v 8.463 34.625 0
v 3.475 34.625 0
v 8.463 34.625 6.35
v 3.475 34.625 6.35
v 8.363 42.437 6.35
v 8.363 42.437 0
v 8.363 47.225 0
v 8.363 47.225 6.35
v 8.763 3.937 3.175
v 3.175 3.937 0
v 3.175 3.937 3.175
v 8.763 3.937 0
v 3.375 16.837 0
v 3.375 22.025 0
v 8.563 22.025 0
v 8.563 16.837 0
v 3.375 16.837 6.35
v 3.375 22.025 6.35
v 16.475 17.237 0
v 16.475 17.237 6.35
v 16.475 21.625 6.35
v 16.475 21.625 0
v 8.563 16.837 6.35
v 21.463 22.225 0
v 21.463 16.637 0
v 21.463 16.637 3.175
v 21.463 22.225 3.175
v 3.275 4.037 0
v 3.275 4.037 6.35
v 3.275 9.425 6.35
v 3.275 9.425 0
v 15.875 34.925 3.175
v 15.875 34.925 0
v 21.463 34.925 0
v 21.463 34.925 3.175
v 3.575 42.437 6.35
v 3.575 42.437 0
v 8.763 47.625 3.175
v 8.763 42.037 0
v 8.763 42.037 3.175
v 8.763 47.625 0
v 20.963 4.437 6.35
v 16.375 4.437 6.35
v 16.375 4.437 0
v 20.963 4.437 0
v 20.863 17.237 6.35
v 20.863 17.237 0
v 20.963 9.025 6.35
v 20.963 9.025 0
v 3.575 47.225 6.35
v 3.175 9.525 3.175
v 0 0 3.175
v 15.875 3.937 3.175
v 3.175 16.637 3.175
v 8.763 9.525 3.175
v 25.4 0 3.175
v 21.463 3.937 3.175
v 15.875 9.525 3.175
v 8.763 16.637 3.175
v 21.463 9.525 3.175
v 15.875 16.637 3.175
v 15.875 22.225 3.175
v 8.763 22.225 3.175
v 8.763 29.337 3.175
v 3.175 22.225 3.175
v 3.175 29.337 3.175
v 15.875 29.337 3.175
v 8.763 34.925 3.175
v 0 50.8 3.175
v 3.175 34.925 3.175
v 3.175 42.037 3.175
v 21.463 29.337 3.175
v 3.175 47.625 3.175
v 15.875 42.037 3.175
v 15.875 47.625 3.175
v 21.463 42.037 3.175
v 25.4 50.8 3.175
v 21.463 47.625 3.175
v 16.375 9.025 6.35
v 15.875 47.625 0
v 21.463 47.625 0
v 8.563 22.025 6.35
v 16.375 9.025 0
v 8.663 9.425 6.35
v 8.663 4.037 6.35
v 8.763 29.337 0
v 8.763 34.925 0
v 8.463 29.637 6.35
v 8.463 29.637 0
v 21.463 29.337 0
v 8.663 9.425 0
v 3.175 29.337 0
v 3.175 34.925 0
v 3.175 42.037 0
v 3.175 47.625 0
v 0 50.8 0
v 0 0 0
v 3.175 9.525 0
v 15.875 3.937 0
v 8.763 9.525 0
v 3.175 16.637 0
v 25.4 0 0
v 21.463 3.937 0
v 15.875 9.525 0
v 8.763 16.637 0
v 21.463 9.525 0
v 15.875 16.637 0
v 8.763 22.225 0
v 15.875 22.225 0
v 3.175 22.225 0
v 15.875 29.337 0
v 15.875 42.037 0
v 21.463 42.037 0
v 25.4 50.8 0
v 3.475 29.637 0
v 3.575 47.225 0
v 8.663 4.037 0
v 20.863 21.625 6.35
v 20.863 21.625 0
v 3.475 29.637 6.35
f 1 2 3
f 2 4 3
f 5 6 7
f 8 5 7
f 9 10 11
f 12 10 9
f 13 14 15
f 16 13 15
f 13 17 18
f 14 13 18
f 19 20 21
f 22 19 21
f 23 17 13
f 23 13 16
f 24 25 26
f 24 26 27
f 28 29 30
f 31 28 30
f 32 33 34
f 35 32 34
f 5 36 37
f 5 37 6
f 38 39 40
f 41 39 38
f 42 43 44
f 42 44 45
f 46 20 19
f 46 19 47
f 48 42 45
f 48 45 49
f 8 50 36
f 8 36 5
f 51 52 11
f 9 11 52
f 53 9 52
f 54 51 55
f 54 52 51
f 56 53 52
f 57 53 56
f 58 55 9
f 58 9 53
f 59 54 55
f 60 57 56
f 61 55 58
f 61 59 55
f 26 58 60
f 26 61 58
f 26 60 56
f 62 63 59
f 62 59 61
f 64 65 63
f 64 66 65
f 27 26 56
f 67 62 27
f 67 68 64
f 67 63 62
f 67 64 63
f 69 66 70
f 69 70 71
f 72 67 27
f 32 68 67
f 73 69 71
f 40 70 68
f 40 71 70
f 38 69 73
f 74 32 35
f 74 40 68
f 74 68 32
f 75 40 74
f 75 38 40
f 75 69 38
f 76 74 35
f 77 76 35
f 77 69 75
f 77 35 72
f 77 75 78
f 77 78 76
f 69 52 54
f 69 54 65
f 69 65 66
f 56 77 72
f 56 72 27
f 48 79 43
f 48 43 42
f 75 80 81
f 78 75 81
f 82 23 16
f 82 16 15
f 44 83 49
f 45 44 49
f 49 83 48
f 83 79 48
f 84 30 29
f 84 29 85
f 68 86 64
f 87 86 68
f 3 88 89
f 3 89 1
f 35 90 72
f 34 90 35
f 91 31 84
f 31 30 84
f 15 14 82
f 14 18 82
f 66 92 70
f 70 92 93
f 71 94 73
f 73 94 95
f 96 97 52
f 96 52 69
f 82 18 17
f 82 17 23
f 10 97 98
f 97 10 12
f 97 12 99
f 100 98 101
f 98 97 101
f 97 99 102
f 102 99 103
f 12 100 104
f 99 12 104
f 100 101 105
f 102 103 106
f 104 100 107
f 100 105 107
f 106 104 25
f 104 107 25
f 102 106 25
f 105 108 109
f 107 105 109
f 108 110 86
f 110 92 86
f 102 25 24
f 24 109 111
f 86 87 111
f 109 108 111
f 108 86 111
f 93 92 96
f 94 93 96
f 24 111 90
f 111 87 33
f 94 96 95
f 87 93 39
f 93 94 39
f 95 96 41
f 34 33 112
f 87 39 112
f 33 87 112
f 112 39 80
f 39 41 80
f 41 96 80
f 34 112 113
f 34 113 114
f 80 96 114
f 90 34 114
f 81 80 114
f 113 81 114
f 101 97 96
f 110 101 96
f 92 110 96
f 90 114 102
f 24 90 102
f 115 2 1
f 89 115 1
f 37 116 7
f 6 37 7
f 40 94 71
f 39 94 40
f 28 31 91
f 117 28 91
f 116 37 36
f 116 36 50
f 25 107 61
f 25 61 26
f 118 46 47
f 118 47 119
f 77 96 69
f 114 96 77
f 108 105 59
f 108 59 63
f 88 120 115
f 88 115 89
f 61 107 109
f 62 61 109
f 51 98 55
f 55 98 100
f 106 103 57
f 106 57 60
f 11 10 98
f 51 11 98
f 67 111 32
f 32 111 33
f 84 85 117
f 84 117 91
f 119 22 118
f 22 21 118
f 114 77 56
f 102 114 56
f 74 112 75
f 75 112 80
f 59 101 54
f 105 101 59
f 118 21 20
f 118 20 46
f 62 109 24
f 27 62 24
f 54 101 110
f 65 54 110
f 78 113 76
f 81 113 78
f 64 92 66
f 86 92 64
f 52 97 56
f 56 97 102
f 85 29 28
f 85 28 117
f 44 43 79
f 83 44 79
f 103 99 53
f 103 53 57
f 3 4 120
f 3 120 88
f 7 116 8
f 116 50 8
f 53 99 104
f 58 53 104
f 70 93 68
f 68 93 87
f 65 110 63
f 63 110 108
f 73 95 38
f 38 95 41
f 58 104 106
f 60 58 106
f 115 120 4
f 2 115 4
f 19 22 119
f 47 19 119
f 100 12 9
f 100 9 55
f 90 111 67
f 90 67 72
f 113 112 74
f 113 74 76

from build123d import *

# Parameters (mm, degrees)
F0_W          = 50.8
F0_H          = 50.8
F0_W_2        = 5.588
F0_H_2        = 5.588
F1_DEPTH      = 3.175
F2_W          = 5.188
F2_H          = 5.188
F2_W_2        = 5.388
F2_H_2        = 5.388
F2_W_3        = 4.988
F2_H_3        = 4.988
F2_W_4        = 4.788
F2_H_4        = 4.788
F2_W_5        = 4.388
F2_H_5        = 4.388
F2_W_6        = 4.588
F2_H_6        = 4.588
F3_DEPTH      = 3.175
F3_DEPTH_BACK = 3.175
F5_DEPTH      = 25.4


with BuildPart() as f1:
    # F0 (on Top) → F1 (new body)
    with BuildSketch(Plane.XY):
        with Locations((25.4, 25.4)):
            Rectangle(F0_W, F0_H)
        with Locations((5.969, 6.731)):
            Rectangle(F0_W_2, F0_H_2, mode=Mode.SUBTRACT)
        with Locations((18.669, 6.731)):
            Rectangle(F0_W_2, F0_H_2, mode=Mode.SUBTRACT)
        with Locations((5.969, 19.431)):
            Rectangle(F0_W_2, F0_H_2, mode=Mode.SUBTRACT)
        with Locations((18.669, 19.431)):
            Rectangle(F0_W_2, F0_H_2, mode=Mode.SUBTRACT)
        with Locations((31.369, 6.731)):
            Rectangle(F0_W_2, F0_H_2, mode=Mode.SUBTRACT)
        with Locations((44.069, 6.731)):
            Rectangle(F0_W_2, F0_H_2, mode=Mode.SUBTRACT)
        with Locations((31.369, 19.431)):
            Rectangle(F0_W_2, F0_H_2, mode=Mode.SUBTRACT)
        with Locations((44.069, 19.431)):
            Rectangle(F0_W_2, F0_H_2, mode=Mode.SUBTRACT)
        with Locations((5.969, 32.131)):
            Rectangle(F0_W_2, F0_H_2, mode=Mode.SUBTRACT)
        with Locations((18.669, 32.131)):
            Rectangle(F0_W_2, F0_H_2, mode=Mode.SUBTRACT)
        with Locations((5.969, 44.831)):
            Rectangle(F0_W_2, F0_H_2, mode=Mode.SUBTRACT)
        with Locations((18.669, 44.831)):
            Rectangle(F0_W_2, F0_H_2, mode=Mode.SUBTRACT)
        with Locations((31.369, 32.131)):
            Rectangle(F0_W_2, F0_H_2, mode=Mode.SUBTRACT)
        with Locations((44.069, 32.131)):
            Rectangle(F0_W_2, F0_H_2, mode=Mode.SUBTRACT)
        with Locations((31.369, 44.831)):
            Rectangle(F0_W_2, F0_H_2, mode=Mode.SUBTRACT)
        with Locations((44.069, 44.831)):
            Rectangle(F0_W_2, F0_H_2, mode=Mode.SUBTRACT)
    extrude(amount=F1_DEPTH)

    # F4 (on face) → F5 (cut)
    with BuildSketch(Plane.XY.offset(3.175)):
        Polygon((25.4, 25.4), (25.4, 0), (50.8, 0), (50.8, 50.8), (25.4, 50.8), align=None)
    extrude(amount=-F5_DEPTH, mode=Mode.SUBTRACT)


with BuildPart() as f3:
    # F2 (on face) → F3 (new body, two sides)
    with BuildSketch(Plane.XY.offset(3.175)) as f3_sk:
        with Locations((5.969, 19.431)):
            Rectangle(F2_W, F2_H)
        with Locations((5.969, 6.731)):
            Rectangle(F2_W_2, F2_H_2)
        with Locations((5.969, 32.131)):
            Rectangle(F2_W_3, F2_H_3)
        with Locations((5.969, 44.831)):
            Rectangle(F2_W_4, F2_H_4)
        with Locations((18.669, 19.431)):
            Rectangle(F2_W_5, F2_H_5)
        with Locations((18.669, 6.731)):
            Rectangle(F2_W_6, F2_H_6)
    extrude(amount=F3_DEPTH)
    extrude(f3_sk.sketch, amount=-F3_DEPTH_BACK)


solid = Compound([f1.part, f3.part])
